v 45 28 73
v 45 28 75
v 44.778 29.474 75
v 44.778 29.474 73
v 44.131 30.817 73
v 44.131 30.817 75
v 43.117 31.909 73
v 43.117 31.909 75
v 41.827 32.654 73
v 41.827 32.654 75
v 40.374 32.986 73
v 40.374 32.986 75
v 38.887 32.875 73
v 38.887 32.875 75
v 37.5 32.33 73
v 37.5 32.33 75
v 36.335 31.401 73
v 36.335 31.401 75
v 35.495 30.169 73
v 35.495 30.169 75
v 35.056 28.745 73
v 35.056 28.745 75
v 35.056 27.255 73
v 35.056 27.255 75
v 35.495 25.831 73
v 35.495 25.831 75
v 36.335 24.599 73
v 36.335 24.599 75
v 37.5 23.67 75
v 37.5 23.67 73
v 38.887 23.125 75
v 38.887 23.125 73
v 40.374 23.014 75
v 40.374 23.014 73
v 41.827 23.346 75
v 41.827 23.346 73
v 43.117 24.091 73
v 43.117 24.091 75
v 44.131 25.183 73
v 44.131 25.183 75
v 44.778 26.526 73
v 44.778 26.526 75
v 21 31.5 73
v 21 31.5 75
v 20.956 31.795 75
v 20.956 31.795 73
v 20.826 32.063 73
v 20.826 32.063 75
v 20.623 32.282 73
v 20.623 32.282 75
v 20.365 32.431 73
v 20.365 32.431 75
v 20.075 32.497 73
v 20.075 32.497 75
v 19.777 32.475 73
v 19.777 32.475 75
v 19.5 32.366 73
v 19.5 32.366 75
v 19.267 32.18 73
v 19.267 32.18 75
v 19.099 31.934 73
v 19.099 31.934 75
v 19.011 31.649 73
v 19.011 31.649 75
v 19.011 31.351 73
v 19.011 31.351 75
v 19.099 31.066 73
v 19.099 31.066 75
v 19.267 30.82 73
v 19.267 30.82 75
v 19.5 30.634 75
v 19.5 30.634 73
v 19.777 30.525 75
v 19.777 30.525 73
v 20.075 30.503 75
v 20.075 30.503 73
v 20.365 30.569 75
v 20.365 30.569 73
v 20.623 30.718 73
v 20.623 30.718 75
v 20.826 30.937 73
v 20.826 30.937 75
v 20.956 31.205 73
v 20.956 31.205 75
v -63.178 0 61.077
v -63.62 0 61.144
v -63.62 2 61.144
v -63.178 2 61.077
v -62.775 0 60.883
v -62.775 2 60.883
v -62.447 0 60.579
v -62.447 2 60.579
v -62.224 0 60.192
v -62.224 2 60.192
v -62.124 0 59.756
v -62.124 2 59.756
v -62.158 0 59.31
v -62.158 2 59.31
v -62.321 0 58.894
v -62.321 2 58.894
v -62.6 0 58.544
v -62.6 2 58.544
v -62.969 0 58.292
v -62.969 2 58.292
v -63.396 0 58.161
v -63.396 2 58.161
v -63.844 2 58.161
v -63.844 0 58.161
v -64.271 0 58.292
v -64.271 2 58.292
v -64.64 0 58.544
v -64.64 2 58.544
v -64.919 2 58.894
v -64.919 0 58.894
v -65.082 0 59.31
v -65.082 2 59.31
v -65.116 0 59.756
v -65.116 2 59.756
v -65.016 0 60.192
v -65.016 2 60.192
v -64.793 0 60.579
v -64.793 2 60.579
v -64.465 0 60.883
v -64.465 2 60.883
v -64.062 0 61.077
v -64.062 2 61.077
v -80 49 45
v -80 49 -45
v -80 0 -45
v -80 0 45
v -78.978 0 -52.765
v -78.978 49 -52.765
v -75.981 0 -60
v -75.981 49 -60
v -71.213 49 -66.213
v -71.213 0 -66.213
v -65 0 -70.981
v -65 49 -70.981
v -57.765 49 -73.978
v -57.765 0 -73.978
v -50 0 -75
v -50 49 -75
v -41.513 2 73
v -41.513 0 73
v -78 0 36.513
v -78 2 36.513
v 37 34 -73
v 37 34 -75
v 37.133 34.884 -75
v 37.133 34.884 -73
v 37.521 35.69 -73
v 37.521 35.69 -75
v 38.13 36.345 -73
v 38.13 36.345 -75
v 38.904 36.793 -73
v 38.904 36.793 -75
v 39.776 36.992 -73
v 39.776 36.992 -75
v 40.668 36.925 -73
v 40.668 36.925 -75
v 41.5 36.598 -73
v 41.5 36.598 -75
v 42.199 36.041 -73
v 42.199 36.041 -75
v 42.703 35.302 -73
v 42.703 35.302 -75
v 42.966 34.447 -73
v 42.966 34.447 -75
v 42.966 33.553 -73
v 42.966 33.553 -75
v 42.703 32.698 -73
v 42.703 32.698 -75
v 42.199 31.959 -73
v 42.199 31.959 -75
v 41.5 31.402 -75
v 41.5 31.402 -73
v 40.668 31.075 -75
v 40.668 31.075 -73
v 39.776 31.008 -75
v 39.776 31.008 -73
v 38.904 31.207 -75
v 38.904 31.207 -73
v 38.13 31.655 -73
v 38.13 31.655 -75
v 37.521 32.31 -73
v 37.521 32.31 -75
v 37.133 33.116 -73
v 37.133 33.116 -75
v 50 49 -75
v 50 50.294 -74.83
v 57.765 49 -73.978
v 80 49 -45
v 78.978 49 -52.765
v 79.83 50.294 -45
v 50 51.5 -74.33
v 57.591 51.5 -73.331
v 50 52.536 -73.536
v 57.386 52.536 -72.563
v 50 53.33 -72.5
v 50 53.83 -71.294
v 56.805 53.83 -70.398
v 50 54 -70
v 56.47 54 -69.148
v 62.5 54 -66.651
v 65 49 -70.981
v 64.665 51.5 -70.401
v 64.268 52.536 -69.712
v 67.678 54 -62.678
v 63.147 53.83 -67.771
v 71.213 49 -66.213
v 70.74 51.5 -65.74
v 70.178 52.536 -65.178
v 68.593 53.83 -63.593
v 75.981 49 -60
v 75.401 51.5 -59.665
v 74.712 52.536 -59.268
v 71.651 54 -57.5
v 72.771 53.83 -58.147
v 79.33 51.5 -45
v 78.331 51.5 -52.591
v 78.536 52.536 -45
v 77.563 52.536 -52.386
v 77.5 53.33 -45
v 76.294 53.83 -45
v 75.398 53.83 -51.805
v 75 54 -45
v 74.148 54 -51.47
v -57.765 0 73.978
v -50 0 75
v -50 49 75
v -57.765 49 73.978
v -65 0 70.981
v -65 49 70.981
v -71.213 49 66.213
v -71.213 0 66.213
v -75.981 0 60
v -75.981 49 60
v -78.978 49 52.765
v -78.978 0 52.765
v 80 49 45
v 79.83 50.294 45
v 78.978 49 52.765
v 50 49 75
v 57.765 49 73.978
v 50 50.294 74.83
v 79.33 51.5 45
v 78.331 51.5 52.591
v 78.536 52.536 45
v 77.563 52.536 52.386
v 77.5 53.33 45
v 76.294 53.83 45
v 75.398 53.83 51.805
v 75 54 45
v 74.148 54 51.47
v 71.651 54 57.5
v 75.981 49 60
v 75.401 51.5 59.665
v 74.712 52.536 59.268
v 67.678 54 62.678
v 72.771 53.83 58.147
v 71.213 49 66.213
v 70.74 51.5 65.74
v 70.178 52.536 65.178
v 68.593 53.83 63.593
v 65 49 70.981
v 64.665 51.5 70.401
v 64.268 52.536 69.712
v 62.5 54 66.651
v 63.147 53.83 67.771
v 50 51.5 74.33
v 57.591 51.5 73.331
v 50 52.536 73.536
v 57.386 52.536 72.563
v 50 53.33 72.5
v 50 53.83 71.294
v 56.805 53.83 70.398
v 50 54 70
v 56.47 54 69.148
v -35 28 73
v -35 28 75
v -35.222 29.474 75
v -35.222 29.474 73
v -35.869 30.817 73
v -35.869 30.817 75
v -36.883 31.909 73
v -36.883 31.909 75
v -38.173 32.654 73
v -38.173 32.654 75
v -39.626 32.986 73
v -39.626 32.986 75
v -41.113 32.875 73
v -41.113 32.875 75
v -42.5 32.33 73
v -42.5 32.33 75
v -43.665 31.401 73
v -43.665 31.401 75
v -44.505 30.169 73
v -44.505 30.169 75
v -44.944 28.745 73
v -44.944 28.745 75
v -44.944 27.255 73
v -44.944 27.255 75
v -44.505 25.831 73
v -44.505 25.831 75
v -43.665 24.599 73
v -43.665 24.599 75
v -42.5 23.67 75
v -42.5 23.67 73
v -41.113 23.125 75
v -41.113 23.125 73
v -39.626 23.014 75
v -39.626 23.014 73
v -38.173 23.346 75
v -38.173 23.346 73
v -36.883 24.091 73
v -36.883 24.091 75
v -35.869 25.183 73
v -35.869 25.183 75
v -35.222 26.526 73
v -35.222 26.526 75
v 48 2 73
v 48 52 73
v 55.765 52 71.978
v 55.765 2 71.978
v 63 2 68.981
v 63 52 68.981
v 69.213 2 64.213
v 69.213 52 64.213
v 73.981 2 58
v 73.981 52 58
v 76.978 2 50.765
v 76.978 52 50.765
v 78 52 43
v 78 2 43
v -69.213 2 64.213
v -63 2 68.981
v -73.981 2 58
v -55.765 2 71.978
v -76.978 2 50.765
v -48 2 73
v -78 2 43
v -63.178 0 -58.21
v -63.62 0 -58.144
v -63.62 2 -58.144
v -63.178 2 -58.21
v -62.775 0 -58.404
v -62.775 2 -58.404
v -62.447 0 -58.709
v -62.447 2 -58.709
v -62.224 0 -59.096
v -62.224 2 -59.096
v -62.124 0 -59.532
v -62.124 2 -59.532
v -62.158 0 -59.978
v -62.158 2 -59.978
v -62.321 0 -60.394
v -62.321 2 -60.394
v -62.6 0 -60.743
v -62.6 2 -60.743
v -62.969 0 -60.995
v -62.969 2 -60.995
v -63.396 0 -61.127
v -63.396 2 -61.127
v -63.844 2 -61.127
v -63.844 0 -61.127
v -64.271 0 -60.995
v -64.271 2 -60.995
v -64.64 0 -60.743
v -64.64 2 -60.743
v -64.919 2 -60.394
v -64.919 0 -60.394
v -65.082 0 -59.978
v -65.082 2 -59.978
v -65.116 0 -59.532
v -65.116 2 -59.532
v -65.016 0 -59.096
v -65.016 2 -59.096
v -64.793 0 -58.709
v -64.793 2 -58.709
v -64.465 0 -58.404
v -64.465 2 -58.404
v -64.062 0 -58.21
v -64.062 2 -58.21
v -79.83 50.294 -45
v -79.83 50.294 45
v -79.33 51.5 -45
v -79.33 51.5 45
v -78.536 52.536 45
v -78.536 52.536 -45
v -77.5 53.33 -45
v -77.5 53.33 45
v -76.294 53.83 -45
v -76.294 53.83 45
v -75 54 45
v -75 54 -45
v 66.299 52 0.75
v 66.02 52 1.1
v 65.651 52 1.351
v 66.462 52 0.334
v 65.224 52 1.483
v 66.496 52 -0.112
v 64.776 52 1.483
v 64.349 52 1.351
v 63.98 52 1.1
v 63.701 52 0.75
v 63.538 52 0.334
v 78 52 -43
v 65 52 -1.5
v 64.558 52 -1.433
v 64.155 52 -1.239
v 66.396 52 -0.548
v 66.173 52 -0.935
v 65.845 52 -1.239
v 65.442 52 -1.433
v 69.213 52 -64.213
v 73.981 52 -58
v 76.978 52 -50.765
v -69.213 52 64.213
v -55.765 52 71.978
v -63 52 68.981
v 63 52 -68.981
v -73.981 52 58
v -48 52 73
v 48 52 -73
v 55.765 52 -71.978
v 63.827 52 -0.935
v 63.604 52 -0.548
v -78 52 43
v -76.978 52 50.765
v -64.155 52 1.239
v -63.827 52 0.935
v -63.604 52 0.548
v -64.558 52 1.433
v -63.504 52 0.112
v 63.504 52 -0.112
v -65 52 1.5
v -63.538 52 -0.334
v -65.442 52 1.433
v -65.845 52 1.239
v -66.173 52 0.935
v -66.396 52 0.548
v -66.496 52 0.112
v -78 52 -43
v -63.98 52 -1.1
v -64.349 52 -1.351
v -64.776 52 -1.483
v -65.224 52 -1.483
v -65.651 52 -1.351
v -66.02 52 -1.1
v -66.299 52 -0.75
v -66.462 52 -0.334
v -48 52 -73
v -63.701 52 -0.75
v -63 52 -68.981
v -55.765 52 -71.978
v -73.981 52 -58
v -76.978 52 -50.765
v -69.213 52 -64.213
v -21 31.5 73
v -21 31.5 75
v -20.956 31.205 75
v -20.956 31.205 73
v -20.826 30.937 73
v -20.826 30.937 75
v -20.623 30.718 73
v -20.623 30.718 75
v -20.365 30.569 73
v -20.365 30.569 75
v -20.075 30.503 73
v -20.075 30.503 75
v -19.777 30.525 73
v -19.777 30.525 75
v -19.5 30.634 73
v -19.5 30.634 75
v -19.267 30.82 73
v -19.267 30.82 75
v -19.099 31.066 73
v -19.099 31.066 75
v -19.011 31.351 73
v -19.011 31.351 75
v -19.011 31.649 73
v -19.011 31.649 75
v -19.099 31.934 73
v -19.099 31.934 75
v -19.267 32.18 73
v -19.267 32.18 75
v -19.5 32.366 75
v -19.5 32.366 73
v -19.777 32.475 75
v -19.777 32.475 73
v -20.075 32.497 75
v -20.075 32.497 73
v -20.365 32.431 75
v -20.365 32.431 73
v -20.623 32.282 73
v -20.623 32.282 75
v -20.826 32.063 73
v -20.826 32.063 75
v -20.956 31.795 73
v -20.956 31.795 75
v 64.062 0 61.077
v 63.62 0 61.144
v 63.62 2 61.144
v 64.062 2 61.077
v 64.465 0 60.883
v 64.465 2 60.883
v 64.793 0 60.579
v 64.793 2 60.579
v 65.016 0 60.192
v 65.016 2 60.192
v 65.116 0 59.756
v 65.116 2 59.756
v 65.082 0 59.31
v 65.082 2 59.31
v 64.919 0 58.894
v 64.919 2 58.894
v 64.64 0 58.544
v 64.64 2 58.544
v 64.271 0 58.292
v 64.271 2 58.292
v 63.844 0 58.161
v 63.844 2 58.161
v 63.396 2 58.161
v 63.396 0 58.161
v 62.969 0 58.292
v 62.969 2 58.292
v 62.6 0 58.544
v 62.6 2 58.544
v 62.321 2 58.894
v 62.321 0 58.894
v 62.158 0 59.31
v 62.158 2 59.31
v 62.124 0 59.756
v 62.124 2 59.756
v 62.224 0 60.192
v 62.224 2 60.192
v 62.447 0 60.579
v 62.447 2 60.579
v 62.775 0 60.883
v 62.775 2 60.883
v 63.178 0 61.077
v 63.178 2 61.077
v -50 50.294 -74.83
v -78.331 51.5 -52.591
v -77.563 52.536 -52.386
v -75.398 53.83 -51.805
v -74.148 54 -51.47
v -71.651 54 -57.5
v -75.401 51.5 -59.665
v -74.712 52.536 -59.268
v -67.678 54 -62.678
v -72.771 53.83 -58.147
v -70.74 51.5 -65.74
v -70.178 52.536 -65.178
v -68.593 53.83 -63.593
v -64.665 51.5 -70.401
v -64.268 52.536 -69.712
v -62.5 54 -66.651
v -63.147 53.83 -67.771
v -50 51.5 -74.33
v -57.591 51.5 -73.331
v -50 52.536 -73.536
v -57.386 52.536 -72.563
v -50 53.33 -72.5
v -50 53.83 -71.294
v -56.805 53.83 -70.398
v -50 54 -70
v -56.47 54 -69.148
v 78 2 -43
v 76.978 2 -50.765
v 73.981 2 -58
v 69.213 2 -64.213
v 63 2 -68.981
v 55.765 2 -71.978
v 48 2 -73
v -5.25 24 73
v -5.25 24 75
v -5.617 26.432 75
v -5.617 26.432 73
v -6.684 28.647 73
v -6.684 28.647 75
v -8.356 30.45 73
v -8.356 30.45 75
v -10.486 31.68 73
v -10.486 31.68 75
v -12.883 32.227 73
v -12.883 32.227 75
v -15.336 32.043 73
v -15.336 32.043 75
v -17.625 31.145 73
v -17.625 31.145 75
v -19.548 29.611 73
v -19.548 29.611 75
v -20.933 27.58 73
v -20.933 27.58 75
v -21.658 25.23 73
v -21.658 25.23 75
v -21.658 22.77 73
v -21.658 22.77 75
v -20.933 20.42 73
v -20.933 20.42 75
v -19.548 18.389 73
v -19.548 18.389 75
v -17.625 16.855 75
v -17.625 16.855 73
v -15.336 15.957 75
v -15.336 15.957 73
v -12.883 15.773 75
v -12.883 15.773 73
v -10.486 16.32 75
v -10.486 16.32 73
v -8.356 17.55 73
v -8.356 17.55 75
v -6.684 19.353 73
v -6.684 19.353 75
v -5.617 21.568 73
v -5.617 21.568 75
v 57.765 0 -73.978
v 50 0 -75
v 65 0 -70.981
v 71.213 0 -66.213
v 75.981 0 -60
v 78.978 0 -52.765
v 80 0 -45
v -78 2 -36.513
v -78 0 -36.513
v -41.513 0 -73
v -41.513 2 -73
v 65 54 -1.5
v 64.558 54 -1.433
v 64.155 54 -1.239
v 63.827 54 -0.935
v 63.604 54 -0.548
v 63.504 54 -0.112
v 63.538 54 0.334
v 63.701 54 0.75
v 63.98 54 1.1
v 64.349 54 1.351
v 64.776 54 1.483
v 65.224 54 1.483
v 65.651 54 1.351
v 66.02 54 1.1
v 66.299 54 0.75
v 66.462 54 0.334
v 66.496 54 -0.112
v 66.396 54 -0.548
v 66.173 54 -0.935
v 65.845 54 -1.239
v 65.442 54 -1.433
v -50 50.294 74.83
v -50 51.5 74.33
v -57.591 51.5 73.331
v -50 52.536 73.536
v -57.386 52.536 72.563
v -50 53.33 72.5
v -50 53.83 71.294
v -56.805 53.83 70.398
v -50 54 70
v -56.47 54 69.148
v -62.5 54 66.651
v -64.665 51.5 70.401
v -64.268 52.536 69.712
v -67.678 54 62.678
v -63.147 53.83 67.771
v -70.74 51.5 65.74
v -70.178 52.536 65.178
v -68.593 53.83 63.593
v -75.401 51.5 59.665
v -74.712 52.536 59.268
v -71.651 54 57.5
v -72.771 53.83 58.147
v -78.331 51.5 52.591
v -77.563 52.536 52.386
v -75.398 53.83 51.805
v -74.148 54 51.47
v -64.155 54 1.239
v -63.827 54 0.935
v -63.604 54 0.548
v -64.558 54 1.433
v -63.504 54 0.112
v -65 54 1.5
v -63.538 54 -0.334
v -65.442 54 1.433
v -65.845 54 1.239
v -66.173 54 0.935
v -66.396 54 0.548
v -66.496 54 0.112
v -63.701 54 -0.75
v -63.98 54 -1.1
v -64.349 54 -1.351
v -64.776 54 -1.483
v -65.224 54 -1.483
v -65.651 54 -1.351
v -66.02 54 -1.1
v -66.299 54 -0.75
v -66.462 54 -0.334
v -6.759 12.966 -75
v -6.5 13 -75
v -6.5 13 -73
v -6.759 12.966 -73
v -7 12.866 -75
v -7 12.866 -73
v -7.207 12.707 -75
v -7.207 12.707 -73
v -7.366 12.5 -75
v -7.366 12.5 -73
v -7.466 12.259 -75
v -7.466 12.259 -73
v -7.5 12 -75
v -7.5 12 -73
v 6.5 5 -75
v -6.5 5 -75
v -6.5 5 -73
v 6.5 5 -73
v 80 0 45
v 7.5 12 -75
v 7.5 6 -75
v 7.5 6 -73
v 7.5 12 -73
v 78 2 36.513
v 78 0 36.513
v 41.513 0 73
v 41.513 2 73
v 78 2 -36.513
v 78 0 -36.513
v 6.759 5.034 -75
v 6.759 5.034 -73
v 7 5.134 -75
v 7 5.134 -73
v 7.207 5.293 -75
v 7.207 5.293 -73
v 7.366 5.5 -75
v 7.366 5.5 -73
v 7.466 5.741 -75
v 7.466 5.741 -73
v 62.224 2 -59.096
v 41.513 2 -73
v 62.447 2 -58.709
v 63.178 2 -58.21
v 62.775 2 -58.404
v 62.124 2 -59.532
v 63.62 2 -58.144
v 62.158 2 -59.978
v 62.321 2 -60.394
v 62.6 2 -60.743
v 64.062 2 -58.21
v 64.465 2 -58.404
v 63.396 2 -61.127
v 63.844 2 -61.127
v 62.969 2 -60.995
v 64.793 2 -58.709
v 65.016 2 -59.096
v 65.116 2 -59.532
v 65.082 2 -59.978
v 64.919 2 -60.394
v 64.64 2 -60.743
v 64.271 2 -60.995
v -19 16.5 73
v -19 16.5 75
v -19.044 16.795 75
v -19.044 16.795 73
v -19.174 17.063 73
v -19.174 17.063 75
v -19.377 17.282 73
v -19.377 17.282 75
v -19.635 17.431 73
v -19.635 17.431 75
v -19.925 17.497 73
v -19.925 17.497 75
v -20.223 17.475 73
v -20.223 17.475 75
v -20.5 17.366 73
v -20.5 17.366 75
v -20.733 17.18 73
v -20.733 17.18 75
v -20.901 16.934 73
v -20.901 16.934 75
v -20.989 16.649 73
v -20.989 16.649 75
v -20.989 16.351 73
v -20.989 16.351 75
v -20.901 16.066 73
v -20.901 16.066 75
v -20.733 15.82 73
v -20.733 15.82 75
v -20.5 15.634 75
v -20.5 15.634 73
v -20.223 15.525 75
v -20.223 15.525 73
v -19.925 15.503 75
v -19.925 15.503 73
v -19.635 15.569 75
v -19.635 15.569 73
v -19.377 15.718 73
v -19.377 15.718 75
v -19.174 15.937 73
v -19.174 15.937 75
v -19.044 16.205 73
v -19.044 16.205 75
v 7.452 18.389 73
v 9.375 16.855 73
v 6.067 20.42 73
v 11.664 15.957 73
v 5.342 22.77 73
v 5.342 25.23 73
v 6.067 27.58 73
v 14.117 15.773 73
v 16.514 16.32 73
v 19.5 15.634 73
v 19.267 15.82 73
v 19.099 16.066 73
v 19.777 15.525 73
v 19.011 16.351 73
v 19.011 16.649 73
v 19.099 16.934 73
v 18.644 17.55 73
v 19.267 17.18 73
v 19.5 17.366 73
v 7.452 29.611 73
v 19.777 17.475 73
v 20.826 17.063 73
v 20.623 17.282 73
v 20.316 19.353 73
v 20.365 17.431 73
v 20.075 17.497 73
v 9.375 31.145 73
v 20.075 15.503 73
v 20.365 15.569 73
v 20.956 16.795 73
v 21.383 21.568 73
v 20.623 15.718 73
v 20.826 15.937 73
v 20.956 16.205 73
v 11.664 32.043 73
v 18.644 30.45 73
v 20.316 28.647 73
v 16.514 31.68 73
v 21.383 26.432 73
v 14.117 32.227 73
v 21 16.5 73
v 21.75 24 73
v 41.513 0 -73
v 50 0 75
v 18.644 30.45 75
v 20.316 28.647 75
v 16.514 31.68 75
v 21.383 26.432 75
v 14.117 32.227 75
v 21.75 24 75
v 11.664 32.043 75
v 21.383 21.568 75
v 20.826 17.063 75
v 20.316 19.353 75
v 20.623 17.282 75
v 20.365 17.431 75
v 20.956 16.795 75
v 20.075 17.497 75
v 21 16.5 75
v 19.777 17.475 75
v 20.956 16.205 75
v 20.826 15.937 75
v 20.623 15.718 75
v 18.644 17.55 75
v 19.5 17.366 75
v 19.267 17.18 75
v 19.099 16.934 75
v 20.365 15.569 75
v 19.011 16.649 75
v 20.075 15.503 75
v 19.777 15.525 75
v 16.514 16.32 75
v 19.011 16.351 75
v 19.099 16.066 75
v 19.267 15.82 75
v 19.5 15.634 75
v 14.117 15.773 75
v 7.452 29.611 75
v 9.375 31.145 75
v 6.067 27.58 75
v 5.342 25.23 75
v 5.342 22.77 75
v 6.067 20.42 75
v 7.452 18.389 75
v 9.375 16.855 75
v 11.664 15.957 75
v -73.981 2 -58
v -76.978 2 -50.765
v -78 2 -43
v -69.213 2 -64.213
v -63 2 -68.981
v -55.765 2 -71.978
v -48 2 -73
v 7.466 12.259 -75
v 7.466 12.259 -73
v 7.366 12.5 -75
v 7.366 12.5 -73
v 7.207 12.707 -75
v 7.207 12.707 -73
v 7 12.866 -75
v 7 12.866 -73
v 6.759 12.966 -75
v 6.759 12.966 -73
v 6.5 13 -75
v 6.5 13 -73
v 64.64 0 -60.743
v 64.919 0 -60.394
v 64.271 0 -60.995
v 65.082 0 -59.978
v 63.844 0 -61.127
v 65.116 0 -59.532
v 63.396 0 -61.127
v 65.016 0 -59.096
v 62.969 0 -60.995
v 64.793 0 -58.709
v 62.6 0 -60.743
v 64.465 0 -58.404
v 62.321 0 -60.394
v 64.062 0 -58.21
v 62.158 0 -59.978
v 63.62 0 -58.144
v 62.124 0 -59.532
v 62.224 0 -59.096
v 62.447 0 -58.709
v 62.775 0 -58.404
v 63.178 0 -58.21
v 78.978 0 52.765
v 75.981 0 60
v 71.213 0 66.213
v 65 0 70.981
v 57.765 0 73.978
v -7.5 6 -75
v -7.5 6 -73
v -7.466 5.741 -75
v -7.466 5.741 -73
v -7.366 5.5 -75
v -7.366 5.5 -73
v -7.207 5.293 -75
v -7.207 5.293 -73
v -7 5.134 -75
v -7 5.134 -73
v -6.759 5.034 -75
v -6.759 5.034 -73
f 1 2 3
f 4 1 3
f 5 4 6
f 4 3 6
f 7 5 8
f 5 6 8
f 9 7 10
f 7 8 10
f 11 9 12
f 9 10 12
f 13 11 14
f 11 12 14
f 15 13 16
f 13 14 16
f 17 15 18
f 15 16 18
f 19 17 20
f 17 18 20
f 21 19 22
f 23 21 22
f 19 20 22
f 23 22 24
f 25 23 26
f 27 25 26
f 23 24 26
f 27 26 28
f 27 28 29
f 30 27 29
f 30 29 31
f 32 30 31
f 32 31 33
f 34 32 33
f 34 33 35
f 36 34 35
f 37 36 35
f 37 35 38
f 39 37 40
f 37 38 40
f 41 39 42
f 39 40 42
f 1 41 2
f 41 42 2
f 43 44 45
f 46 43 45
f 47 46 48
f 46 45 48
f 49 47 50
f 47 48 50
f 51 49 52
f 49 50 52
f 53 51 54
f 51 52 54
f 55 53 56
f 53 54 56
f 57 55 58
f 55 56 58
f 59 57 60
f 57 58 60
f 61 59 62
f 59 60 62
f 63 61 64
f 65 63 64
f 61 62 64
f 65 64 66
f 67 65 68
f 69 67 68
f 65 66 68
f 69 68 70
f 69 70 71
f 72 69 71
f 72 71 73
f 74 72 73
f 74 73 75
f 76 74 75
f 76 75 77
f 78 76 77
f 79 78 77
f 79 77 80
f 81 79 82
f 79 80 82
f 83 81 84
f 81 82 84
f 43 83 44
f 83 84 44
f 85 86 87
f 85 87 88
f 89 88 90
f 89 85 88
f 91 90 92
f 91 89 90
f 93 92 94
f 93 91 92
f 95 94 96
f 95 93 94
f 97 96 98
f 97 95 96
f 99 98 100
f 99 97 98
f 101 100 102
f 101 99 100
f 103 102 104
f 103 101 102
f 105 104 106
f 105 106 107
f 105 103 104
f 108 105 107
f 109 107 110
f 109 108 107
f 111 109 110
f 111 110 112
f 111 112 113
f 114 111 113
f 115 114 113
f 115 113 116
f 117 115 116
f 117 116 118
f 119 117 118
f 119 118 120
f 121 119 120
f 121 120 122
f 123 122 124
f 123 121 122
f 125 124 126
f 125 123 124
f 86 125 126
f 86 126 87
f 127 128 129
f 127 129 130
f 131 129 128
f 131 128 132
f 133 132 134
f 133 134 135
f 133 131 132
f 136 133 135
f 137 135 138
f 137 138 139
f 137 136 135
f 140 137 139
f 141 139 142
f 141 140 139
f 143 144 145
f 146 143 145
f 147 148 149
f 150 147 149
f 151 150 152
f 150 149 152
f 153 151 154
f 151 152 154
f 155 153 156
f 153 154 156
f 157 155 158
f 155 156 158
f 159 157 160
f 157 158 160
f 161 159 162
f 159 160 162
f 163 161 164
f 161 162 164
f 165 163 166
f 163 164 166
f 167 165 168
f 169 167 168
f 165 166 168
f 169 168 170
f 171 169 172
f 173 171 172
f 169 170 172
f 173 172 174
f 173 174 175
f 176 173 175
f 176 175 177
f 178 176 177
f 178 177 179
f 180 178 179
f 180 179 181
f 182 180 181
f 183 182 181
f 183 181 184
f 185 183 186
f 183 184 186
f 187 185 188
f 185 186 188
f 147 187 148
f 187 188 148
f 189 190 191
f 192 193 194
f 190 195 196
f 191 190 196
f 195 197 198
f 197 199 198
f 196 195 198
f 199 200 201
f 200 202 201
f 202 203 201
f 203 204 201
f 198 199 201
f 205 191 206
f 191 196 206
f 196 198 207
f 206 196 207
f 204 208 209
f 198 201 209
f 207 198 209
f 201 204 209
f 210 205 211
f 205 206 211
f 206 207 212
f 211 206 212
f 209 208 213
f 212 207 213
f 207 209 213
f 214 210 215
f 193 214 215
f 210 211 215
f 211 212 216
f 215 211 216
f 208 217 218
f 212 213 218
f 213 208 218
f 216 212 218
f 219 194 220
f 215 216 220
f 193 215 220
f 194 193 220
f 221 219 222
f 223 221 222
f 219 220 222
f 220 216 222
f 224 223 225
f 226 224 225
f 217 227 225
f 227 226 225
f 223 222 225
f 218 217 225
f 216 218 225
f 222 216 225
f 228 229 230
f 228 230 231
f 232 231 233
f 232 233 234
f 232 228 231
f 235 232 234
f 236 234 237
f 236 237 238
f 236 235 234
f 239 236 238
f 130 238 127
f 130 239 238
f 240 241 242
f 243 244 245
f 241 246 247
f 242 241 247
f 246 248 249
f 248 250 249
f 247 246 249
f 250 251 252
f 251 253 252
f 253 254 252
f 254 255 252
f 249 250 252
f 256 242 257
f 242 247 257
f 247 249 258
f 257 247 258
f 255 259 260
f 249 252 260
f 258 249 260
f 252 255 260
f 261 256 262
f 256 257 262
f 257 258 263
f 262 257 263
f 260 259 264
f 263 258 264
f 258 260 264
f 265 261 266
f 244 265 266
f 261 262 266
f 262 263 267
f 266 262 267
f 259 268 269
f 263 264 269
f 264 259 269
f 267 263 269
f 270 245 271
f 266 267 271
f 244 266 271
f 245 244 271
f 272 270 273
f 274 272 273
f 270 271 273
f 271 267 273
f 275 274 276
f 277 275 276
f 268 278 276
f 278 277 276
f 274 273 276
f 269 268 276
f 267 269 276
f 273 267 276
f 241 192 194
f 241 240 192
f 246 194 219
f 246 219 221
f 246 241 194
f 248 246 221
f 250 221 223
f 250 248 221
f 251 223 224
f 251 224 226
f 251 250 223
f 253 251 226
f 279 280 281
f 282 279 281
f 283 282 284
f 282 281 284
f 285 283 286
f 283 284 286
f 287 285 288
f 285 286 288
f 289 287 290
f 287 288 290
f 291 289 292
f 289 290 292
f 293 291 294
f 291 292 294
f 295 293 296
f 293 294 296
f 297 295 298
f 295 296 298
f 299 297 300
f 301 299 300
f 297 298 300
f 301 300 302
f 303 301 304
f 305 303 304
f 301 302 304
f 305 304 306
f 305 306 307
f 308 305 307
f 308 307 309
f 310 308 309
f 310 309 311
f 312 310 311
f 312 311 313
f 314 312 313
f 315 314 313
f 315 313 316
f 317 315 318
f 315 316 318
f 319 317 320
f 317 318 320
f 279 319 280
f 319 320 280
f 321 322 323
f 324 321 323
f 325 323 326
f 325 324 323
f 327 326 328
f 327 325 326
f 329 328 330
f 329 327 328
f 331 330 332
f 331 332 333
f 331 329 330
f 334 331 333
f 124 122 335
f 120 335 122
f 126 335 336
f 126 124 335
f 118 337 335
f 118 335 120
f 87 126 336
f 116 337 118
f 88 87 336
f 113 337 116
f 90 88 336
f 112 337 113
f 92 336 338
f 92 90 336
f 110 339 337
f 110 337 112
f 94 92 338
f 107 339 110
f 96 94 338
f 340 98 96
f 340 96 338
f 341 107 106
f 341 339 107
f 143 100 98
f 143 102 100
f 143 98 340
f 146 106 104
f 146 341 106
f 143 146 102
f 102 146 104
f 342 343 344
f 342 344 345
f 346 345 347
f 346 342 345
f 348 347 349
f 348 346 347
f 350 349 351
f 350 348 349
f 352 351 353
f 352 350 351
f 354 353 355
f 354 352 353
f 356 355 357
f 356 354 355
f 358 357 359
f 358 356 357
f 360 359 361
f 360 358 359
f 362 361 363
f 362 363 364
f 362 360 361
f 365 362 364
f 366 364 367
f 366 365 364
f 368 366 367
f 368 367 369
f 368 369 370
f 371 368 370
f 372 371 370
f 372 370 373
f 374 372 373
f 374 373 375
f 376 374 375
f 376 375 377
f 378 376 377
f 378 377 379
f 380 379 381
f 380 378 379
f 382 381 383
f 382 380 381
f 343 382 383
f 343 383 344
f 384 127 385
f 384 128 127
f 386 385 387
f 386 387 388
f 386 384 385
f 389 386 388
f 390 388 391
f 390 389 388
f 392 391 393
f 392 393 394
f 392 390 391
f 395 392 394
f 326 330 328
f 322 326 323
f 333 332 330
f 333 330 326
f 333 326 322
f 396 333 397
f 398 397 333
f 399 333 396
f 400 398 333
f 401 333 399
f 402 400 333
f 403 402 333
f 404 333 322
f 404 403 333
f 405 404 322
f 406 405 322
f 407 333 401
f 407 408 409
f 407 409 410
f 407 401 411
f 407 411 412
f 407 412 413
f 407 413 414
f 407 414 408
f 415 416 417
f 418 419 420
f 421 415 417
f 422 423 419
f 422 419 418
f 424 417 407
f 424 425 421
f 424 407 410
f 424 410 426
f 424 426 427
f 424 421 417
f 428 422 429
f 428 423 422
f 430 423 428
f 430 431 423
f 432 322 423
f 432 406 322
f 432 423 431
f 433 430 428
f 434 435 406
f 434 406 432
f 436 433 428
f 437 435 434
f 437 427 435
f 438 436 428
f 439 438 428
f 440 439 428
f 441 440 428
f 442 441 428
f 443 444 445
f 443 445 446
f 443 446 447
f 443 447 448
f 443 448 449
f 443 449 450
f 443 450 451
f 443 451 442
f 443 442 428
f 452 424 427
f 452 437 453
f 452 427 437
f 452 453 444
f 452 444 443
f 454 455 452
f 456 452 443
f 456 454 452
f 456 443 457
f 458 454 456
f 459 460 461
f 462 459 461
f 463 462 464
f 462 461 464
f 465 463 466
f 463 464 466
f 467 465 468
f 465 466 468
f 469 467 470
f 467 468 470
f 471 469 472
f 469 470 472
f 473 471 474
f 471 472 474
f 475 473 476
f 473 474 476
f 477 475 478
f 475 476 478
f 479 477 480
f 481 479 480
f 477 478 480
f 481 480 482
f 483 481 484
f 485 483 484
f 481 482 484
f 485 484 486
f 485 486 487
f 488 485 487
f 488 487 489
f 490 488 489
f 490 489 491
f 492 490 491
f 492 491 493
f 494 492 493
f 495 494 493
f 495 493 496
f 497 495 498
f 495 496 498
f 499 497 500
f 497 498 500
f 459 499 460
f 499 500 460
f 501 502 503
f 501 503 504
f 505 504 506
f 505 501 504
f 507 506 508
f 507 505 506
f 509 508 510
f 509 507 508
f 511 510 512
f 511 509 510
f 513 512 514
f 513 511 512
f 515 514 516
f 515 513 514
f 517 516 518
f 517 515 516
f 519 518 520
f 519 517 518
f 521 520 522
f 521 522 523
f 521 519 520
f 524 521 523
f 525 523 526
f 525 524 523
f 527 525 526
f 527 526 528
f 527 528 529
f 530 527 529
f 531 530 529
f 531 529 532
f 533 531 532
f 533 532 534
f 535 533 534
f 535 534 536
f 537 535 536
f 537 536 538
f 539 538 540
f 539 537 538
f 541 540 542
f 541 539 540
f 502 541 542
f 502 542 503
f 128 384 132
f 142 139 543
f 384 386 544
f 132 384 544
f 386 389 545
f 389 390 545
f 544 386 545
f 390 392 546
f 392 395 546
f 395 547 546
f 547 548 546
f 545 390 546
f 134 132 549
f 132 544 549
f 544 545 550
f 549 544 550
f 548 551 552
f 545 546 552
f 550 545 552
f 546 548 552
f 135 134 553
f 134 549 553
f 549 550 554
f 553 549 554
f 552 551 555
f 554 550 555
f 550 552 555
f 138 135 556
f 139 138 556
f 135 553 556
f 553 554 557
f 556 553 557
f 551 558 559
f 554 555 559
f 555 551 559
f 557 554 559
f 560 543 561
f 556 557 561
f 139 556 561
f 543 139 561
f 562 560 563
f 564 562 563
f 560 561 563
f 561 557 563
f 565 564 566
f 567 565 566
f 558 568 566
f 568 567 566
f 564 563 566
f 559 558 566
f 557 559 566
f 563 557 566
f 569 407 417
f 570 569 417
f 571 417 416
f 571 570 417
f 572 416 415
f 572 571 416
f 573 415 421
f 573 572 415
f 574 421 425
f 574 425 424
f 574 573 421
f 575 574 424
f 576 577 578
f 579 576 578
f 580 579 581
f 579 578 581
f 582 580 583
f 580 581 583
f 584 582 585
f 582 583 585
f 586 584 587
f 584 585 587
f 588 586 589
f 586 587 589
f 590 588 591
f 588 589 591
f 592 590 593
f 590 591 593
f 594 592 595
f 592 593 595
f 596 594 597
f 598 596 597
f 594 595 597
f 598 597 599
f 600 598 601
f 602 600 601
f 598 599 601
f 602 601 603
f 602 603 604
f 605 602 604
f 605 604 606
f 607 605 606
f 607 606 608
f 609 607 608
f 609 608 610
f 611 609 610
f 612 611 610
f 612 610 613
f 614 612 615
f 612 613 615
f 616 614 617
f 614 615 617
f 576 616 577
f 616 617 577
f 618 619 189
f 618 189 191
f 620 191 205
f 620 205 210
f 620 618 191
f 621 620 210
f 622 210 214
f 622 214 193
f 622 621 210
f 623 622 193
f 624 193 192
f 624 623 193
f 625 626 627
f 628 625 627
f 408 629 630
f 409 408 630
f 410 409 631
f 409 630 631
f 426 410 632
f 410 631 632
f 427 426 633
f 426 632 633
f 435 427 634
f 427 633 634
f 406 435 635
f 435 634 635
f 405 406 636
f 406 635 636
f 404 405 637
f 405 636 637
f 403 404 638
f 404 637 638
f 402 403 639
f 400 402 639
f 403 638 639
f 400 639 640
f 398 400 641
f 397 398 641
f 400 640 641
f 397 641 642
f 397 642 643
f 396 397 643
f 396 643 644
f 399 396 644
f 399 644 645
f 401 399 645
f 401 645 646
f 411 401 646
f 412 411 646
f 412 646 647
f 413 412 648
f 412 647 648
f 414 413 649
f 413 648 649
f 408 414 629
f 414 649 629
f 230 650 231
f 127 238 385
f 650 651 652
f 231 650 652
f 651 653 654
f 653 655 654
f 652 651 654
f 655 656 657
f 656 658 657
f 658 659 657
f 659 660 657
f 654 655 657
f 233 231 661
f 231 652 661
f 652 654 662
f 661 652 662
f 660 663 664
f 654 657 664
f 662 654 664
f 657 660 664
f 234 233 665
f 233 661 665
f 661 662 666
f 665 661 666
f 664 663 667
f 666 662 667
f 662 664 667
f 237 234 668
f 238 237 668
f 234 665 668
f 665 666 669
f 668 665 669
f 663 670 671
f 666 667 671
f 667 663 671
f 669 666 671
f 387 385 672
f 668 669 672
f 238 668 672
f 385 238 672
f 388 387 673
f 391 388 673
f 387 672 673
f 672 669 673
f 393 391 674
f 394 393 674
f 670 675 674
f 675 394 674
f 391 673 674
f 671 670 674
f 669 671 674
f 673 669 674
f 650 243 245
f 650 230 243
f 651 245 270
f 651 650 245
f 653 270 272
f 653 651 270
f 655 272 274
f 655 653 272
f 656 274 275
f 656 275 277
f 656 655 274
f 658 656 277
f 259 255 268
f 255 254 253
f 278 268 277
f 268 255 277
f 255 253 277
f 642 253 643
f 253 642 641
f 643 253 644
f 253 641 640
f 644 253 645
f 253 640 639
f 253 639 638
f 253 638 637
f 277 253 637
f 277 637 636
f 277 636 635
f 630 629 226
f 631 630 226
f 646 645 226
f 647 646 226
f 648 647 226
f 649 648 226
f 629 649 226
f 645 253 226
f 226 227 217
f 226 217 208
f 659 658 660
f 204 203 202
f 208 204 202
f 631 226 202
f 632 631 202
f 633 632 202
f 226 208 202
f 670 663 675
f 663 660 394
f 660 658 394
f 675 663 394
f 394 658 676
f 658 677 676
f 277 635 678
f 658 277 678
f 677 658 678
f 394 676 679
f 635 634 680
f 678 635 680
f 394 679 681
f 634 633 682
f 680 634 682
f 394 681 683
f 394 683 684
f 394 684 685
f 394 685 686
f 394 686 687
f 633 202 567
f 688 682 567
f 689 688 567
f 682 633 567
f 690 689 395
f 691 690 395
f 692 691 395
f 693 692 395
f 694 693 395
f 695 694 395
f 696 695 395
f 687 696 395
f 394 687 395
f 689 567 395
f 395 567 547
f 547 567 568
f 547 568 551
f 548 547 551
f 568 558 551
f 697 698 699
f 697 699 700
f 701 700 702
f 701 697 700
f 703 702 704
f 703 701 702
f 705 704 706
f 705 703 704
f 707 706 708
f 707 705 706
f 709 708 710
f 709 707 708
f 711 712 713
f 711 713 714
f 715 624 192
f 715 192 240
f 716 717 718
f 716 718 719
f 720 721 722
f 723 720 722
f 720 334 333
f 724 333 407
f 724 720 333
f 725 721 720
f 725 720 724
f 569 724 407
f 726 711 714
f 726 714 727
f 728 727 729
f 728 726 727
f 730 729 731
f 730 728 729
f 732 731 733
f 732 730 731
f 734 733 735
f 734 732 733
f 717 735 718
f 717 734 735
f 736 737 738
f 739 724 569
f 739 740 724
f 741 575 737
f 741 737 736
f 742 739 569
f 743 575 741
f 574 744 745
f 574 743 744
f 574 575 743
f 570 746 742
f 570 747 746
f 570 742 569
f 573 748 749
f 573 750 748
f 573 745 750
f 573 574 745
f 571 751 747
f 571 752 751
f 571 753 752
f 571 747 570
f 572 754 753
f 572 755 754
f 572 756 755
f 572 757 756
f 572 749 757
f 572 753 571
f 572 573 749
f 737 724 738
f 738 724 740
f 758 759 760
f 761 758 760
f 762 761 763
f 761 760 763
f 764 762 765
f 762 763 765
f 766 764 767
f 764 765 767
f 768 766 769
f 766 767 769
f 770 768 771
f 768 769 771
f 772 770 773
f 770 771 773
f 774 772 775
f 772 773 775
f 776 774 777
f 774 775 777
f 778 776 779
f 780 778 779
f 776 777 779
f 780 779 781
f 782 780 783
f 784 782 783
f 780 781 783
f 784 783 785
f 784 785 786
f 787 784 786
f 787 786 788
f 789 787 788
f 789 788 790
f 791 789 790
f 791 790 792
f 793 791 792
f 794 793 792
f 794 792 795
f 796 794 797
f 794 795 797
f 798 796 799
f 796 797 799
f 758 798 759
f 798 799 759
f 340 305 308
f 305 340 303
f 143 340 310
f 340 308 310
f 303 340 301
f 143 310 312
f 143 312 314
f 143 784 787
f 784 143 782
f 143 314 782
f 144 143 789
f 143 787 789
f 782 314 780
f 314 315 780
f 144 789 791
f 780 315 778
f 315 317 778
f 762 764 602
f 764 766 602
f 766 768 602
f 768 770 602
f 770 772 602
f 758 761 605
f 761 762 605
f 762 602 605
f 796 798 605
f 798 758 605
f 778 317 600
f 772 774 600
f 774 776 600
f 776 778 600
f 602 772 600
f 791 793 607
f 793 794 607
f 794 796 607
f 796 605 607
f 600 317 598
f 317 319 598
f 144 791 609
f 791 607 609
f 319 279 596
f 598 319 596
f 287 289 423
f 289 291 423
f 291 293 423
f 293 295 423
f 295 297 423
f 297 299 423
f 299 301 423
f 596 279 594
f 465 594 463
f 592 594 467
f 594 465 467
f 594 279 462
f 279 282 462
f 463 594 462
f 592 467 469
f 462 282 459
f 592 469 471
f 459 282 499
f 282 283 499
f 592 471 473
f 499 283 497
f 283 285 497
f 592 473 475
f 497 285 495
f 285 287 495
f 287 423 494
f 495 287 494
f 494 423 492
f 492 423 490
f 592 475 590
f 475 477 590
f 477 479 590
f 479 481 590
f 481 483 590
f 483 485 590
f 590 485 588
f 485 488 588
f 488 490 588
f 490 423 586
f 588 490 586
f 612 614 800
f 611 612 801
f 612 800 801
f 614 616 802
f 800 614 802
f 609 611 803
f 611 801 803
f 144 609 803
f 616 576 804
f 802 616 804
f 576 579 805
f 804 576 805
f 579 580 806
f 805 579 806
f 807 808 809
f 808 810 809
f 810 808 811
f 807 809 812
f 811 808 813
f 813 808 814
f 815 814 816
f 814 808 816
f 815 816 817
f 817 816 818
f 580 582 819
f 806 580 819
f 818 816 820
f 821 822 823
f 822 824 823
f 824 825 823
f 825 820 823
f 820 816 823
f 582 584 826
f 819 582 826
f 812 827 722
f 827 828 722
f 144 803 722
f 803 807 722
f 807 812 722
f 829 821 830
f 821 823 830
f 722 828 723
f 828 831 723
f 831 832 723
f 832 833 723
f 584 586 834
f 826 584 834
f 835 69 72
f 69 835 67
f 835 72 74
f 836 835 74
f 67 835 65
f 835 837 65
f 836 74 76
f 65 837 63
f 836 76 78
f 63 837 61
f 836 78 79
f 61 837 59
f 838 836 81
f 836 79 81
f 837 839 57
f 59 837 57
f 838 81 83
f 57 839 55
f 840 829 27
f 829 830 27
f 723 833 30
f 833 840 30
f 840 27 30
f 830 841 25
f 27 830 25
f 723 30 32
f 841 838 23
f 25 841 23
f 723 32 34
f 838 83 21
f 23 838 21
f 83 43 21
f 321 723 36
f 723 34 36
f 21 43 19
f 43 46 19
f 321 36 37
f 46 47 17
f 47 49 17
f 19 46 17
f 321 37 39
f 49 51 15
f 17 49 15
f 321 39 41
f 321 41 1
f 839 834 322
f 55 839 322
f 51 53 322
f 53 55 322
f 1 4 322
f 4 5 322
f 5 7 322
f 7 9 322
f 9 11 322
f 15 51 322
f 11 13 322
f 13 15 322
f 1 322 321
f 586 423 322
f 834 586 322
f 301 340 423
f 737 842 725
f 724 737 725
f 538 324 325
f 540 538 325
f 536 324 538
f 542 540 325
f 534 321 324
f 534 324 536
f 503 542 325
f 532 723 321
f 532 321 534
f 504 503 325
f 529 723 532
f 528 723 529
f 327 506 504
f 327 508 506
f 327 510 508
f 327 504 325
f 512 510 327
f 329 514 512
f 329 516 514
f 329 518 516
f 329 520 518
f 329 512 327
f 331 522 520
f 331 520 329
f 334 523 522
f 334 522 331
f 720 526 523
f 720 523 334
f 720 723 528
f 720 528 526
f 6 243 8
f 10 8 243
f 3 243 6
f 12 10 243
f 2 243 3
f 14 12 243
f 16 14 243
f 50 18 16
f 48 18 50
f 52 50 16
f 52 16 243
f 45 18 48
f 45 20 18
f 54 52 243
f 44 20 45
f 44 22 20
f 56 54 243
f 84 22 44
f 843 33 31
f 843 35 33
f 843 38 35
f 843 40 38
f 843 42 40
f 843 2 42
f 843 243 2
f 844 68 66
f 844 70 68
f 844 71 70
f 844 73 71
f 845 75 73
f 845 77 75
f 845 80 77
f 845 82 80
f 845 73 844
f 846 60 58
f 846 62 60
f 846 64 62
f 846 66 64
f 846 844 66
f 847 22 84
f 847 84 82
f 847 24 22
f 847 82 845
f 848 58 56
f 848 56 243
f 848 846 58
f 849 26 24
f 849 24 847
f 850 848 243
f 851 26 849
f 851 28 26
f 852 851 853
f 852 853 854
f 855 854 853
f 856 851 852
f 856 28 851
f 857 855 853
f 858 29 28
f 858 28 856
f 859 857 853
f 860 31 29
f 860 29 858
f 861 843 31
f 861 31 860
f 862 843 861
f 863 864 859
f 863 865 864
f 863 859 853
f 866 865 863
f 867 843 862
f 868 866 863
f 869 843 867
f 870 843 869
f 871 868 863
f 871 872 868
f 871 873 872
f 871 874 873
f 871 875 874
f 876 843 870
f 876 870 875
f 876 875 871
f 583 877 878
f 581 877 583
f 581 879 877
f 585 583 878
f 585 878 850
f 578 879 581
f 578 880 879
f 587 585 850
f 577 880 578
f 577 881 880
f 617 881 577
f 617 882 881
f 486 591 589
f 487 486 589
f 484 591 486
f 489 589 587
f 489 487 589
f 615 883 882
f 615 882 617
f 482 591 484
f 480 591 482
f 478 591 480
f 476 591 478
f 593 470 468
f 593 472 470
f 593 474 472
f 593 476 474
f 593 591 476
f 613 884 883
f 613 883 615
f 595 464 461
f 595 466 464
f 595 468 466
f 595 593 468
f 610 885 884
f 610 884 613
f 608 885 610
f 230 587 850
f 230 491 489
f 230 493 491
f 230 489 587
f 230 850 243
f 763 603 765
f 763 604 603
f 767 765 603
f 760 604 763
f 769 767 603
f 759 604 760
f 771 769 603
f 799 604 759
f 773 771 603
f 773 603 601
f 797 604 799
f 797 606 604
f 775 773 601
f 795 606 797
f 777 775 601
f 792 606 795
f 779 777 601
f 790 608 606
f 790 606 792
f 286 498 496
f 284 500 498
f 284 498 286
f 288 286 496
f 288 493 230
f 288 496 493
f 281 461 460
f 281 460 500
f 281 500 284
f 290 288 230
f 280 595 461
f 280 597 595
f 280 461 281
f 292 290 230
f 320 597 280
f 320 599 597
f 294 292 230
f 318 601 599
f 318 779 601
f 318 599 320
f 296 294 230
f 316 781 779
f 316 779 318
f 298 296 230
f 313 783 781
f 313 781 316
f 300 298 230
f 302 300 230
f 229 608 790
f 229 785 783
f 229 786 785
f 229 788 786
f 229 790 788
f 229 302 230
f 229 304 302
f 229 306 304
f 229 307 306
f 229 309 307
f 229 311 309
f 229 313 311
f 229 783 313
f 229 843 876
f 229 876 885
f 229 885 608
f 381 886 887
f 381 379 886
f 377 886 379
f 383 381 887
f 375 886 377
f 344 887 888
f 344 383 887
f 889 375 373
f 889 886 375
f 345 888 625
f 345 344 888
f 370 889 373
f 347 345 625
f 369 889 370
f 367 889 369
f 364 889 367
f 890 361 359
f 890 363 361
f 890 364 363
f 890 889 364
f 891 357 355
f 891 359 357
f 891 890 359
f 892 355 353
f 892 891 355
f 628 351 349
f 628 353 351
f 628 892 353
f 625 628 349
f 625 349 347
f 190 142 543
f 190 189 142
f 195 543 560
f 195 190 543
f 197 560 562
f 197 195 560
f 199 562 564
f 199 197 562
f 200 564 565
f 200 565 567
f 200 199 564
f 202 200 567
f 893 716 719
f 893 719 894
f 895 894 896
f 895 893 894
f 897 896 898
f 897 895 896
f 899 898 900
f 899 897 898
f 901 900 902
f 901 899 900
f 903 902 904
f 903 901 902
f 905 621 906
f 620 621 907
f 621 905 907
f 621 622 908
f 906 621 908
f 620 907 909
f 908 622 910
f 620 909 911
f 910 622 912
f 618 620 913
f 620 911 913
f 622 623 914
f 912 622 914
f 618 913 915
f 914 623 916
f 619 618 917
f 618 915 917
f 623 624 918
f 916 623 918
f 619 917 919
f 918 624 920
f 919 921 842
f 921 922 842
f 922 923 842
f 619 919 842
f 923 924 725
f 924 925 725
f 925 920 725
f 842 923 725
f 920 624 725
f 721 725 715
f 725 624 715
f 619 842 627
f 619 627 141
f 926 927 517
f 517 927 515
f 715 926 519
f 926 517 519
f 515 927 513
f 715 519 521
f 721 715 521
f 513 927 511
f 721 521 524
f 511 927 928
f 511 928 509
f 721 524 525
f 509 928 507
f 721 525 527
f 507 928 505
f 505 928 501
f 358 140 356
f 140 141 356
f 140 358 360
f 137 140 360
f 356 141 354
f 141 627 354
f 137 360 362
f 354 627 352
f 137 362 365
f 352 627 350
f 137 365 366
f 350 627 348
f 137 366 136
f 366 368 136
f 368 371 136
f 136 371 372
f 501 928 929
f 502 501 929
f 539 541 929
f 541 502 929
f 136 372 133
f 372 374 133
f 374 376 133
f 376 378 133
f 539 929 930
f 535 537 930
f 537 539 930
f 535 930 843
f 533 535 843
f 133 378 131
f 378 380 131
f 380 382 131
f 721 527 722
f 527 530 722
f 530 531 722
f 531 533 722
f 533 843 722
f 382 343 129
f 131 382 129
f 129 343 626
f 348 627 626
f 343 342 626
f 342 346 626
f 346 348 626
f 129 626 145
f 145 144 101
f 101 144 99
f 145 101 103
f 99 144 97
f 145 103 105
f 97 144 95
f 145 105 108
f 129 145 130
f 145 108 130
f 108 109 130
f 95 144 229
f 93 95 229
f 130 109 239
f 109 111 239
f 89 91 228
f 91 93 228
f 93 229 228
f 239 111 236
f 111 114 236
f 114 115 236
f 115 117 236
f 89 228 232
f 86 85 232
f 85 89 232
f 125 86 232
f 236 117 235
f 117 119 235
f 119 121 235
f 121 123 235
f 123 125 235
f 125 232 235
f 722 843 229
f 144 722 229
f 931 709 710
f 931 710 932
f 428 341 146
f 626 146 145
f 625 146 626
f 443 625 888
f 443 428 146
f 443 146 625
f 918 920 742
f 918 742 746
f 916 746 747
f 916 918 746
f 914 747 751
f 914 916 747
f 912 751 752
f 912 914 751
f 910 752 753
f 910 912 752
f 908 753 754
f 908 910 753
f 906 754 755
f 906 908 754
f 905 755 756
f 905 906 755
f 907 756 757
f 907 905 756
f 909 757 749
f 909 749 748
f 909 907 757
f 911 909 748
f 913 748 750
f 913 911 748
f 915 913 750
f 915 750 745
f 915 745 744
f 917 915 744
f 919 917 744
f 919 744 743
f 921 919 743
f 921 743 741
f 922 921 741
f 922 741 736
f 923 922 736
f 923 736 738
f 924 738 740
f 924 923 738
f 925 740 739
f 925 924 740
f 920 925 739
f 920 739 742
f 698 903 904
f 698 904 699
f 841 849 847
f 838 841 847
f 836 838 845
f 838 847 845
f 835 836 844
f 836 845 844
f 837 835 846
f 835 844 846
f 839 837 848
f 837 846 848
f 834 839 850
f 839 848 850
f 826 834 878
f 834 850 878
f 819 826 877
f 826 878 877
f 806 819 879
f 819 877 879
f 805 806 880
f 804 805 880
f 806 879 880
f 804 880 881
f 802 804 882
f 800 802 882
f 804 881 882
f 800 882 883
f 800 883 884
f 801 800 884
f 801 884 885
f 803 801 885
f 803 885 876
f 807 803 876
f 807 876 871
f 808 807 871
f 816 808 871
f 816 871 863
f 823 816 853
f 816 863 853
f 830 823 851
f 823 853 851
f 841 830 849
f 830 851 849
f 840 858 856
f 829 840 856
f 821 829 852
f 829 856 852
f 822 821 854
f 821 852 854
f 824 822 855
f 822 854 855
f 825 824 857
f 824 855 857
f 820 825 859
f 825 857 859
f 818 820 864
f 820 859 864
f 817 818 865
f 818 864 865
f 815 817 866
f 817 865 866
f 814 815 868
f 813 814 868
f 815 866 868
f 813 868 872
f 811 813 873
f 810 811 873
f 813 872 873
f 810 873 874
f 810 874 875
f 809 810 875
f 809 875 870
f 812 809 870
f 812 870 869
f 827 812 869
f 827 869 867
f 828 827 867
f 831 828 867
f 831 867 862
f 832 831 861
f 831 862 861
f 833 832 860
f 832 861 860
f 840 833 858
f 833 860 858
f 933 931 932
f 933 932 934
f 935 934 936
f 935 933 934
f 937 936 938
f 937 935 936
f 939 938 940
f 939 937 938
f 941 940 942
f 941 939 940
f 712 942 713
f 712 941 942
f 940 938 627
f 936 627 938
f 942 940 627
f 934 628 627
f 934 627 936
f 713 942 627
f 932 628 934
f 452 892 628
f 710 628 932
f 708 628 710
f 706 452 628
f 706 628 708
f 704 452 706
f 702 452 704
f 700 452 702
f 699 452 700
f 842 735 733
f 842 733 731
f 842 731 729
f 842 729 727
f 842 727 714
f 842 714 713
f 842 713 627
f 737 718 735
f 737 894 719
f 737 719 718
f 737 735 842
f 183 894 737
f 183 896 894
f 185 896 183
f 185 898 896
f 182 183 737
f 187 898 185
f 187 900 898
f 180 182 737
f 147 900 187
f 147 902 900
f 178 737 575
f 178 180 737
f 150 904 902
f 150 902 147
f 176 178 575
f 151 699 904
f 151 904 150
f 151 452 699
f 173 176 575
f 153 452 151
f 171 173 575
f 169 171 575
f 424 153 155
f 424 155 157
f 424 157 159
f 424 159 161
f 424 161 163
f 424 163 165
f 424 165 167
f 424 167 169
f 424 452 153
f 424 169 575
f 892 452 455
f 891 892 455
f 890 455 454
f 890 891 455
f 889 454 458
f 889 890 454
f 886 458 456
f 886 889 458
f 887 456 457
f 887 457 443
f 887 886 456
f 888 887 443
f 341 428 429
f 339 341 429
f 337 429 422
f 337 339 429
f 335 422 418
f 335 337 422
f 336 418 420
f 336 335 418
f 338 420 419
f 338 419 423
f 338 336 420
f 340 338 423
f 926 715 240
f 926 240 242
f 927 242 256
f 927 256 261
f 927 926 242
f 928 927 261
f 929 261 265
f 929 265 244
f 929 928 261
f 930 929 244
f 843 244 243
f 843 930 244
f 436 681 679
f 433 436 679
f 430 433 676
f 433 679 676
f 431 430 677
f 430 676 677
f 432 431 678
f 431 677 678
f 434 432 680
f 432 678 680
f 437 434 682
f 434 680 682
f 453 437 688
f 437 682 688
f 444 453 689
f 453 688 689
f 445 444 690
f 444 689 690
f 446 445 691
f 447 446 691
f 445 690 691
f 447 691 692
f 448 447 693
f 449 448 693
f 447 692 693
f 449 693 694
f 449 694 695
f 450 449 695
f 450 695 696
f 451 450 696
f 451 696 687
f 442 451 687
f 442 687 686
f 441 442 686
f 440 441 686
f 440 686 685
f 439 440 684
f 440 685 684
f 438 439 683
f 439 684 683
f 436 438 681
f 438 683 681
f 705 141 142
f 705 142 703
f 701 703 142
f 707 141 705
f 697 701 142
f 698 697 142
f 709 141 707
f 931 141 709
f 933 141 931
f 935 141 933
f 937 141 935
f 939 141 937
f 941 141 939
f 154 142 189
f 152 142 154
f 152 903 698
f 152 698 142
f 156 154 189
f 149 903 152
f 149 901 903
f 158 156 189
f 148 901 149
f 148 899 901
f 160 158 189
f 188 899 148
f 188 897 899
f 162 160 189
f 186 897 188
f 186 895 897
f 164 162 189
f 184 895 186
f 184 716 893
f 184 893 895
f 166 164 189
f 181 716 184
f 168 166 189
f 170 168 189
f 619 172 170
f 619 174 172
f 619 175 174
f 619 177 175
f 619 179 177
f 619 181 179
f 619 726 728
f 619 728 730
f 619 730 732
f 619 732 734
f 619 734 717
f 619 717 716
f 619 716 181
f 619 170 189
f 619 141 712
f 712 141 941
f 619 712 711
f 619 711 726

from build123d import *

# Parameters (mm, degrees)
SKETCH1_R           = 1.5
BOTTOM_DEPTH        = 2
BOTTOM_2_DEPTH      = 2
BOTTOM_3_DEPTH      = 2
BOTTOM_4_DEPTH      = 2
WALLS_DEPTH         = 50
TOP_DEPTH           = 2
SKETCH4_R           = 1
SKETCH4_R_2         = 8.25
CUT_EXTRUDE2_DEPTH  = 2
SKETCH5_R           = 5
CUT_EXTRUDE3_DEPTH  = 2
SKETCH6_R           = 3
CUT_EXTRUDE4_DEPTH  = 2
SKETCH8_R           = 1.5
CUT_EXTRUDE5_DEPTH  = 2
BOSS_EXTRUDE5_DEPTH = 2
FILLET1_R           = 5
CUT_EXTRUDE6_DEPTH  = 10


with BuildPart() as part:
    # Sketch1 → Bottom (new body)
    with BuildSketch(Plane(origin=(0, 0, 0), x_dir=(1, 0, 0), z_dir=(0, 1, 0))):
        with BuildLine():
            ThreePointArc((-80, -45), (-71.213203436, -66.213203436), (-50, -75))
            Line((-50, -75), (-39.513159642, -75))
            Line((-39.513159642, -75), (-80, -34.513159642))
            Line((-80, -34.513159642), (-80, -45))
        make_face()
        with Locations(Location((-63.62, -59.64375, 0), (0, 0, 270))):
            Circle(SKETCH1_R, mode=Mode.SUBTRACT)
    extrude(amount=BOTTOM_DEPTH)



with BuildPart() as body_2:
    # Sketch1 → Bottom 2 (new body)
    with BuildSketch(Plane(origin=(0, 0, 0), x_dir=(1, 0, 0), z_dir=(0, 1, 0))):
        with BuildLine():
            Line((-80, 45), (-80, 34.513159642))
            Line((-80, 34.513159642), (-39.513159642, 75))
            Line((-39.513159642, 75), (-50, 75))
            ThreePointArc((-50, 75), (-71.213203436, 66.213203436), (-80, 45))
        make_face()
        with Locations(Location((-63.62, 59.64375, 0), (0, 0, 270))):
            Circle(SKETCH1_R, mode=Mode.SUBTRACT)
    extrude(amount=BOTTOM_2_DEPTH)


with BuildPart() as body_3:
    # Sketch1 → Bottom 3 (new body)
    with BuildSketch(Plane(origin=(0, 0, 0), x_dir=(1, 0, 0), z_dir=(0, 1, 0))):
        with BuildLine():
            Line((39.513159642, 75), (80, 34.513159642))
            Line((80, 34.513159642), (80, 45))
            ThreePointArc((80, 45), (71.213203436, 66.213203436), (50, 75))
            Line((50, 75), (39.513159642, 75))
        make_face()
        with Locations(Location((63.62, 59.64375, 0), (0, 0, 270))):
            Circle(SKETCH1_R, mode=Mode.SUBTRACT)
    extrude(amount=BOTTOM_3_DEPTH)


with BuildPart() as body_4:
    # Sketch1 → Bottom 4 (new body)
    with BuildSketch(Plane(origin=(0, 0, 0), x_dir=(1, 0, 0), z_dir=(0, 1, 0))):
        with BuildLine():
            Line((80, -34.513159642), (39.513159642, -75))
            Line((39.513159642, -75), (50, -75))
            ThreePointArc((50, -75), (71.213203436, -66.213203436), (80, -45))
            Line((80, -45), (80, -34.513159642))
        make_face()
        with Locations(Location((63.62, -59.64375, 0), (0, 0, 270))):
            Circle(SKETCH1_R, mode=Mode.SUBTRACT)
    extrude(amount=BOTTOM_4_DEPTH)


with BuildPart() as part_1:
    add(part.part)

    add(body_2.part)  # Walls merges body 2

    add(body_3.part)  # Walls merges body 3

    add(body_4.part)  # Walls merges body 4
    # Sketch2 → Walls (add)
    with BuildSketch(Plane(origin=(0, 2, 0), x_dir=(1, 0, 0), z_dir=(0, 1, 0))):
        with BuildLine():
            Line((50, 75), (-50, 75))
            ThreePointArc((-50, 75), (-71.213203436, 66.213203436), (-80, 45))
            Line((-80, 45), (-80, -45))
            ThreePointArc((-80, -45), (-71.213203436, -66.213203436), (-50, -75))
            Line((-50, -75), (50, -75))
            ThreePointArc((50, -75), (71.213203436, -66.213203436), (80, -45))
            Line((80, -45), (80, 45))
            ThreePointArc((80, 45), (71.213203436, 66.213203436), (50, 75))
        make_face()
        with BuildLine():
            Line((-48, -73), (48, -73))
            ThreePointArc((48, -73), (69.213203436, -64.213203436), (78, -43))
            Line((78, -43), (78, 43))
            ThreePointArc((78, 43), (69.213203436, 64.213203436), (48, 73))
            Line((48, 73), (-48, 73))
            ThreePointArc((-48, 73), (-69.213203436, 64.213203436), (-78, 43))
            Line((-78, 43), (-78, -43))
            ThreePointArc((-78, -43), (-69.213203436, -64.213203436), (-48, -73))
        make_face(mode=Mode.SUBTRACT)
    extrude(amount=WALLS_DEPTH)

    # Sketch3 → Top (add)
    with BuildSketch(Plane(origin=(0, 52, 0), x_dir=(1, 0, 0), z_dir=(0, 1, 0))):
        with BuildLine():
            Line((50, -75), (-50, -75))
            ThreePointArc((-50, -75), (-71.213203436, -66.213203436), (-80, -45))
            Line((-80, -45), (-80, 45))
            ThreePointArc((-80, 45), (-71.213203436, 66.213203436), (-50, 75))
            Line((-50, 75), (50, 75))
            ThreePointArc((50, 75), (71.213203436, 66.213203436), (80, 45))
            Line((80, 45), (80, -45))
            ThreePointArc((80, -45), (71.213203436, -66.213203436), (50, -75))
        make_face()
    extrude(amount=TOP_DEPTH)

    # Sketch4 → Cut-Extrude2 (cut)
    with BuildSketch(Plane.XY.offset(75)):
        with Locations((-20, 16.5)):
            Circle(SKETCH4_R)
        with Locations((-13.5, 24)):
            Circle(SKETCH4_R_2)
        with Locations(Location((-20, 31.5, 0), (0, 0, 180))):
            Circle(SKETCH4_R)
        with Locations((20, 16.5)):
            Circle(SKETCH4_R)
        with Locations((13.5, 24)):
            Circle(SKETCH4_R_2)
        with Locations((20, 31.5)):
            Circle(SKETCH4_R)
    extrude(amount=-CUT_EXTRUDE2_DEPTH, mode=Mode.SUBTRACT)

    # Sketch5 → Cut-Extrude3 (cut)
    with BuildSketch(Plane.XY.offset(75)):
        with Locations((-40, 28)):
            Circle(SKETCH5_R)
        with Locations((40, 28)):
            Circle(SKETCH5_R)
    extrude(amount=-CUT_EXTRUDE3_DEPTH, mode=Mode.SUBTRACT)

    # Sketch6 → Cut-Extrude4 (cut)
    with BuildSketch(Plane(origin=(0, 0, -75), x_dir=(-1, 0, 0), z_dir=(0, 0, -1))):
        with Locations((-40, 34)):
            Circle(SKETCH6_R)
    extrude(amount=-CUT_EXTRUDE4_DEPTH, mode=Mode.SUBTRACT)

    # Sketch8 → Cut-Extrude5 (cut)
    with BuildSketch(Plane(origin=(0, 54, 0), x_dir=(1, 0, 0), z_dir=(0, 1, 0))):
        with Locations(Location((-65, 0, 0), (0, 0, 270))):
            Circle(SKETCH8_R)
        with Locations(Location((65, 0, 0), (0, 0, 90))):
            Circle(SKETCH8_R)
    extrude(amount=-CUT_EXTRUDE5_DEPTH, mode=Mode.SUBTRACT)

    # Sketch9 → Boss-Extrude5 (add)
    with BuildSketch(Plane.XZ.offset(-2)):
        Polygon((-80, 34.513159642), (-78, 36.513159642), (-78, -36.513159642), (-80, -34.513159642), align=None)
        Polygon((-39.513159642, 75), (-41.513159642, 73), (41.513159642, 73), (39.745521731, 74.76763791), (39.513159642, 75), align=None)
        Polygon((78, -36.513159642), (80, -34.513159642), (80, 34.513159642), (78, 36.513159642), align=None)
        Polygon((39.745521731, -74.76763791), (39.513159642, -75), (-39.513159642, -75), (-41.513159642, -73), (41.513159642, -73), align=None)
    extrude(amount=BOSS_EXTRUDE5_DEPTH)

    # Fillet1
    fillet1_edges = [part_1.edges().sort_by_distance(p)[0] for p in [
        (-71.213203436, 54, 66.213203436),
        (0, 54, 75),
        (71.213203436, 54, 66.213203436),
        (80, 54, 0),
        (71.213203436, 54, -66.213203436),
        (0, 54, -75),
        (-71.213203436, 54, -66.213203436),
        (-80, 54, 0),
    ]]
    fillet(fillet1_edges, radius=FILLET1_R)

    # Sketch10 → Cut-Extrude6 (cut)
    with BuildSketch(Plane(origin=(0, 0, -75), x_dir=(-1, 0, 0), z_dir=(0, 0, -1))):
        with BuildLine():
            Line((6.5, 5), (-6.5, 5))
            ThreePointArc((-6.5, 5), (-7.207106781, 5.292893219), (-7.5, 6))
            Line((-7.5, 6), (-7.5, 12))
            ThreePointArc((-7.5, 12), (-7.207106781, 12.707106781), (-6.5, 13))
            Line((-6.5, 13), (6.5, 13))
            ThreePointArc((6.5, 13), (7.207106781, 12.707106781), (7.5, 12))
            Line((7.5, 12), (7.5, 6))
            ThreePointArc((7.5, 6), (7.207106781, 5.292893219), (6.5, 5))
        make_face()
    extrude(amount=-CUT_EXTRUDE6_DEPTH, mode=Mode.SUBTRACT)


solid = part_1.part
